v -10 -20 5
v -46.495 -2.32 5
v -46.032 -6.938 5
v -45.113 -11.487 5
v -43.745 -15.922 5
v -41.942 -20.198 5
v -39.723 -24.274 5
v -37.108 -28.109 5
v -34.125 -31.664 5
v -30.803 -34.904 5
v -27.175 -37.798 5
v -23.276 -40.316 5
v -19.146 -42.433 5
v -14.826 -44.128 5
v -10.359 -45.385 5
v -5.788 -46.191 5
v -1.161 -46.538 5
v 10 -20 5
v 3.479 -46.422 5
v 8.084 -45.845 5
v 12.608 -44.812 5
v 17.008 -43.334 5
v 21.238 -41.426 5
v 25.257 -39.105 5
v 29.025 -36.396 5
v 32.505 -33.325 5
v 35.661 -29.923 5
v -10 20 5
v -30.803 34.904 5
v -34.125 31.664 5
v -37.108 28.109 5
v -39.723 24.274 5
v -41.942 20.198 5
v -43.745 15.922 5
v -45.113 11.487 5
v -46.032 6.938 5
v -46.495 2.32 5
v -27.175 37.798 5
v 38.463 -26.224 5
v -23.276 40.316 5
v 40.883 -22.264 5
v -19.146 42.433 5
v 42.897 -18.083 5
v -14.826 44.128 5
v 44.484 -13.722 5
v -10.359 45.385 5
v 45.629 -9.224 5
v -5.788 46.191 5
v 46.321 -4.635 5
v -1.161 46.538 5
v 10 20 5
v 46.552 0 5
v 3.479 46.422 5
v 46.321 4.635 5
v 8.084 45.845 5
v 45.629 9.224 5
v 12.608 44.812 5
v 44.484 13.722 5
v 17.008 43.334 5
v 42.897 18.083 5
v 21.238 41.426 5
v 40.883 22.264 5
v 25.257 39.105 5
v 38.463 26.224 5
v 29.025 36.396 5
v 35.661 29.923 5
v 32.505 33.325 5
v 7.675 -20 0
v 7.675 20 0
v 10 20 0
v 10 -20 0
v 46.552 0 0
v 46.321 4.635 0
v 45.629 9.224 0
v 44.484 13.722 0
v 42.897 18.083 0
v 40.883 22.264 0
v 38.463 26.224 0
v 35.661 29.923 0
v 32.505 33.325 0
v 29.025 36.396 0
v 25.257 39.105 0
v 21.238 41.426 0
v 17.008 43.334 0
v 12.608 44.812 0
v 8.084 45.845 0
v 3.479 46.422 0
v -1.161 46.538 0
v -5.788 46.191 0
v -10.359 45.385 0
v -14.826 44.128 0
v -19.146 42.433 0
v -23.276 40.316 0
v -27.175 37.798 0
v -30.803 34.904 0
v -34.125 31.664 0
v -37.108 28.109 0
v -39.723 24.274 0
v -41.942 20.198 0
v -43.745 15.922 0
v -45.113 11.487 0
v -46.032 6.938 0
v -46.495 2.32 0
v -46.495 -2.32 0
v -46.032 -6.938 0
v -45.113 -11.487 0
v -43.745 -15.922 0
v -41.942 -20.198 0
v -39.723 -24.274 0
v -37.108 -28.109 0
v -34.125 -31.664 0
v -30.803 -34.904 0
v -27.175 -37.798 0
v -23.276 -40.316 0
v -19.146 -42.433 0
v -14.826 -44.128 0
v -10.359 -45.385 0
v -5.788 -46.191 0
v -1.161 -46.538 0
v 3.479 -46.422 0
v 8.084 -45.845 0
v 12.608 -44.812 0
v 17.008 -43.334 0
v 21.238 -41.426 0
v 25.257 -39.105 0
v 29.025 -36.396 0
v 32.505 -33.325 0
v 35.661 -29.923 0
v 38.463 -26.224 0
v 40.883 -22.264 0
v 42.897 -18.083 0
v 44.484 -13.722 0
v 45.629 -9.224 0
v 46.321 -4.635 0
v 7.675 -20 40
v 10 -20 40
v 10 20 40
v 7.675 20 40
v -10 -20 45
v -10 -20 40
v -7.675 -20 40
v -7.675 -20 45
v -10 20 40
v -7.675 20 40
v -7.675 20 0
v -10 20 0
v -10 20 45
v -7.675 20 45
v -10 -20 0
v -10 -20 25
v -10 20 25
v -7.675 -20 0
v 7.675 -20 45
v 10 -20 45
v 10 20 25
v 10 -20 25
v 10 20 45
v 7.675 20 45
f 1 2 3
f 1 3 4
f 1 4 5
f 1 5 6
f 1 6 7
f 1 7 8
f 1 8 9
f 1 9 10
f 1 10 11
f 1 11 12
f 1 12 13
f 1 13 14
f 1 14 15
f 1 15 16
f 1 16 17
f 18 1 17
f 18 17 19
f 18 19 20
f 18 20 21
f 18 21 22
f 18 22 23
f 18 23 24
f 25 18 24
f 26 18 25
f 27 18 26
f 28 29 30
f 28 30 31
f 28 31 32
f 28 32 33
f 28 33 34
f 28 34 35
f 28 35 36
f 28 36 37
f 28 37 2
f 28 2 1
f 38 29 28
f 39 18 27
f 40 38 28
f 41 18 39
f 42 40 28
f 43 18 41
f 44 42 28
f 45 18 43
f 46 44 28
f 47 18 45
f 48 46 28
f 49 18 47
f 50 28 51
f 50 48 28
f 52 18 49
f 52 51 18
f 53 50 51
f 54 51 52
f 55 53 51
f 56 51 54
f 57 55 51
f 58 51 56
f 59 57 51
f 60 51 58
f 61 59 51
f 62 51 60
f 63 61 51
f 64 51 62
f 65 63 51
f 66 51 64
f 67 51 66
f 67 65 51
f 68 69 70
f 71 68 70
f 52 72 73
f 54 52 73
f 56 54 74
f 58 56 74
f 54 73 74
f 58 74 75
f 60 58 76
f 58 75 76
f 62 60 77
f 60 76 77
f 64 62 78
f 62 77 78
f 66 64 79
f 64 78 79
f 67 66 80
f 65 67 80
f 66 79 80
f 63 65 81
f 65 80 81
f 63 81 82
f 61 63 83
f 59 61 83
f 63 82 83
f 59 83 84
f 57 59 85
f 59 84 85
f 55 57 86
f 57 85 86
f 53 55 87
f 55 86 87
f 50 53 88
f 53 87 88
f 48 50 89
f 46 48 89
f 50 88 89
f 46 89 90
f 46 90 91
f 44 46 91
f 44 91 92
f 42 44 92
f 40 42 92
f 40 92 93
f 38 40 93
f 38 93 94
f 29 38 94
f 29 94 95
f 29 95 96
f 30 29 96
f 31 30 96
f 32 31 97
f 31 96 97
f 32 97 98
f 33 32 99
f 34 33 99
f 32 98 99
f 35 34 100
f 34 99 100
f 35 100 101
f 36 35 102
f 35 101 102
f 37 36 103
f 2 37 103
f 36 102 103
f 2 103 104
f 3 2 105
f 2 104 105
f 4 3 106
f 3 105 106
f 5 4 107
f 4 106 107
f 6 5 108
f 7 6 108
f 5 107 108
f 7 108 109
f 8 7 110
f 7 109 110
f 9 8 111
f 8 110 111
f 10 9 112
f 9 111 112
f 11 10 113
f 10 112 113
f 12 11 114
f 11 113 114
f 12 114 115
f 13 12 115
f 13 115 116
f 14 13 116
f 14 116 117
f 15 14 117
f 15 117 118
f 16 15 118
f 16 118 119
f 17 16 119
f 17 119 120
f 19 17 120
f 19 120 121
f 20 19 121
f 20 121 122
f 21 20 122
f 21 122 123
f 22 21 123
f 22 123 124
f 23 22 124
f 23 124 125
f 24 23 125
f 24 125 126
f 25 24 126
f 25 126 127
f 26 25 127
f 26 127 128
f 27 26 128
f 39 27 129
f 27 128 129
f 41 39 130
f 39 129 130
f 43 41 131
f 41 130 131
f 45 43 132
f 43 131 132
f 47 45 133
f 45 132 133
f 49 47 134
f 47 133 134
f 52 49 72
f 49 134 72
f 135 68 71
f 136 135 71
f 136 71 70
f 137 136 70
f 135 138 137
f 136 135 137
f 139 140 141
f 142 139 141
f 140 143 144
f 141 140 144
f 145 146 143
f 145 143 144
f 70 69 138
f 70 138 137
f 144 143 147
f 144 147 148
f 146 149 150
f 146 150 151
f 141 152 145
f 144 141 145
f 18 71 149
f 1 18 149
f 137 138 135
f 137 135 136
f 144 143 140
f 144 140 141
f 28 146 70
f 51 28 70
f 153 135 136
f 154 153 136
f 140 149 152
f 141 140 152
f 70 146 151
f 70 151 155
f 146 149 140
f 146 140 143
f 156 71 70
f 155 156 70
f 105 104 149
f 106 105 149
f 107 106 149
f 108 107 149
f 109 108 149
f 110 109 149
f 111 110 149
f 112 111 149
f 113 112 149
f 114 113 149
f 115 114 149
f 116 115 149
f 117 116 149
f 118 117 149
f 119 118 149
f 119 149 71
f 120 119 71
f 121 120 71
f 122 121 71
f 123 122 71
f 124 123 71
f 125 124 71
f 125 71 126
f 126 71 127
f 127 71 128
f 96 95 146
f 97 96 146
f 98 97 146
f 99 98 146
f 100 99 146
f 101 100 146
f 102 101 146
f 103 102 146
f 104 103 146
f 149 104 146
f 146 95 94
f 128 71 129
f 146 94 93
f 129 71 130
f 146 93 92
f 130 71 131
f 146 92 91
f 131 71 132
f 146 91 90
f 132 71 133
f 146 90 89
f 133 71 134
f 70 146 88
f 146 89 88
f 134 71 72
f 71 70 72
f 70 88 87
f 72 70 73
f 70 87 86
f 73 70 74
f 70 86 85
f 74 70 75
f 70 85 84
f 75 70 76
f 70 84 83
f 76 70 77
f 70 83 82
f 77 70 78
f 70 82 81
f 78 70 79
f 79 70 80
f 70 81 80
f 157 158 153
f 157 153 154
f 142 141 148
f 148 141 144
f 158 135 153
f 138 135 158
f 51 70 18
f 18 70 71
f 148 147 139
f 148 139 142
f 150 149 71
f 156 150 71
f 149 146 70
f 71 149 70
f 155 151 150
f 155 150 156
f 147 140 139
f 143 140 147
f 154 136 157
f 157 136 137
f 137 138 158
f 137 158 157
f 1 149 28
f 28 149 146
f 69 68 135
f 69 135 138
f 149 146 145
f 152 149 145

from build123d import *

# Parameters (mm, degrees)
F0_R     = 46.5524103188
F1_DEPTH = 5
F0_W     = 2.325
F0_H     = 40
F2_DEPTH = 40
F3_W     = 20
F3_H     = 40
F4_DEPTH = 25
F5_DEPTH = 5


with BuildPart() as f1:
    # F0 (on Top) → F1 (new body)
    with BuildSketch(Plane.XY):
        Circle(F0_R)
        Polygon((10, -20), (7.675, -20), (-7.675, -20), (-10, -20), (-10, 20), (-7.675, 20), (7.675, 20), (10, 20), align=None, mode=Mode.SUBTRACT)
    extrude(amount=F1_DEPTH)


with BuildPart() as f2:
    # F0 (on Top) → F2 (new body)
    with BuildSketch(Plane.XY):
        with Locations((-8.8375, 0)):
            Rectangle(F0_W, F0_H)
    extrude(amount=F2_DEPTH)


with BuildPart() as f2b:
    # F0 (on Top) → F2, piece 2 (new body)
    with BuildSketch(Plane.XY):
        with Locations((8.8375, 0)):
            Rectangle(F0_W, F0_H)
    extrude(amount=F2_DEPTH)


with BuildPart() as f4:
    # F3 (on Top) → F4 (new body)
    with BuildSketch(Plane.XY):
        Rectangle(F3_W, F3_H)
    extrude(amount=F4_DEPTH)


with BuildPart() as f5:
    # F5 (new): a face of the model
    f5_faces = [f2.part.faces().sort_by_distance(p)[0] for p in [
        (-8.8375, 0, 40),
    ]]
    extrude(f5_faces, amount=F5_DEPTH)


with BuildPart() as f5b:
    # F5#2 (new): a face of the model
    f5_2_faces = [f2b.part.faces().sort_by_distance(p)[0] for p in [
        (8.8375, 0, 40),
    ]]
    extrude(f5_2_faces, amount=F5_DEPTH)


solid = Compound([f1.part, f2.part, f2b.part, f4.part, f5.part, f5b.part])
